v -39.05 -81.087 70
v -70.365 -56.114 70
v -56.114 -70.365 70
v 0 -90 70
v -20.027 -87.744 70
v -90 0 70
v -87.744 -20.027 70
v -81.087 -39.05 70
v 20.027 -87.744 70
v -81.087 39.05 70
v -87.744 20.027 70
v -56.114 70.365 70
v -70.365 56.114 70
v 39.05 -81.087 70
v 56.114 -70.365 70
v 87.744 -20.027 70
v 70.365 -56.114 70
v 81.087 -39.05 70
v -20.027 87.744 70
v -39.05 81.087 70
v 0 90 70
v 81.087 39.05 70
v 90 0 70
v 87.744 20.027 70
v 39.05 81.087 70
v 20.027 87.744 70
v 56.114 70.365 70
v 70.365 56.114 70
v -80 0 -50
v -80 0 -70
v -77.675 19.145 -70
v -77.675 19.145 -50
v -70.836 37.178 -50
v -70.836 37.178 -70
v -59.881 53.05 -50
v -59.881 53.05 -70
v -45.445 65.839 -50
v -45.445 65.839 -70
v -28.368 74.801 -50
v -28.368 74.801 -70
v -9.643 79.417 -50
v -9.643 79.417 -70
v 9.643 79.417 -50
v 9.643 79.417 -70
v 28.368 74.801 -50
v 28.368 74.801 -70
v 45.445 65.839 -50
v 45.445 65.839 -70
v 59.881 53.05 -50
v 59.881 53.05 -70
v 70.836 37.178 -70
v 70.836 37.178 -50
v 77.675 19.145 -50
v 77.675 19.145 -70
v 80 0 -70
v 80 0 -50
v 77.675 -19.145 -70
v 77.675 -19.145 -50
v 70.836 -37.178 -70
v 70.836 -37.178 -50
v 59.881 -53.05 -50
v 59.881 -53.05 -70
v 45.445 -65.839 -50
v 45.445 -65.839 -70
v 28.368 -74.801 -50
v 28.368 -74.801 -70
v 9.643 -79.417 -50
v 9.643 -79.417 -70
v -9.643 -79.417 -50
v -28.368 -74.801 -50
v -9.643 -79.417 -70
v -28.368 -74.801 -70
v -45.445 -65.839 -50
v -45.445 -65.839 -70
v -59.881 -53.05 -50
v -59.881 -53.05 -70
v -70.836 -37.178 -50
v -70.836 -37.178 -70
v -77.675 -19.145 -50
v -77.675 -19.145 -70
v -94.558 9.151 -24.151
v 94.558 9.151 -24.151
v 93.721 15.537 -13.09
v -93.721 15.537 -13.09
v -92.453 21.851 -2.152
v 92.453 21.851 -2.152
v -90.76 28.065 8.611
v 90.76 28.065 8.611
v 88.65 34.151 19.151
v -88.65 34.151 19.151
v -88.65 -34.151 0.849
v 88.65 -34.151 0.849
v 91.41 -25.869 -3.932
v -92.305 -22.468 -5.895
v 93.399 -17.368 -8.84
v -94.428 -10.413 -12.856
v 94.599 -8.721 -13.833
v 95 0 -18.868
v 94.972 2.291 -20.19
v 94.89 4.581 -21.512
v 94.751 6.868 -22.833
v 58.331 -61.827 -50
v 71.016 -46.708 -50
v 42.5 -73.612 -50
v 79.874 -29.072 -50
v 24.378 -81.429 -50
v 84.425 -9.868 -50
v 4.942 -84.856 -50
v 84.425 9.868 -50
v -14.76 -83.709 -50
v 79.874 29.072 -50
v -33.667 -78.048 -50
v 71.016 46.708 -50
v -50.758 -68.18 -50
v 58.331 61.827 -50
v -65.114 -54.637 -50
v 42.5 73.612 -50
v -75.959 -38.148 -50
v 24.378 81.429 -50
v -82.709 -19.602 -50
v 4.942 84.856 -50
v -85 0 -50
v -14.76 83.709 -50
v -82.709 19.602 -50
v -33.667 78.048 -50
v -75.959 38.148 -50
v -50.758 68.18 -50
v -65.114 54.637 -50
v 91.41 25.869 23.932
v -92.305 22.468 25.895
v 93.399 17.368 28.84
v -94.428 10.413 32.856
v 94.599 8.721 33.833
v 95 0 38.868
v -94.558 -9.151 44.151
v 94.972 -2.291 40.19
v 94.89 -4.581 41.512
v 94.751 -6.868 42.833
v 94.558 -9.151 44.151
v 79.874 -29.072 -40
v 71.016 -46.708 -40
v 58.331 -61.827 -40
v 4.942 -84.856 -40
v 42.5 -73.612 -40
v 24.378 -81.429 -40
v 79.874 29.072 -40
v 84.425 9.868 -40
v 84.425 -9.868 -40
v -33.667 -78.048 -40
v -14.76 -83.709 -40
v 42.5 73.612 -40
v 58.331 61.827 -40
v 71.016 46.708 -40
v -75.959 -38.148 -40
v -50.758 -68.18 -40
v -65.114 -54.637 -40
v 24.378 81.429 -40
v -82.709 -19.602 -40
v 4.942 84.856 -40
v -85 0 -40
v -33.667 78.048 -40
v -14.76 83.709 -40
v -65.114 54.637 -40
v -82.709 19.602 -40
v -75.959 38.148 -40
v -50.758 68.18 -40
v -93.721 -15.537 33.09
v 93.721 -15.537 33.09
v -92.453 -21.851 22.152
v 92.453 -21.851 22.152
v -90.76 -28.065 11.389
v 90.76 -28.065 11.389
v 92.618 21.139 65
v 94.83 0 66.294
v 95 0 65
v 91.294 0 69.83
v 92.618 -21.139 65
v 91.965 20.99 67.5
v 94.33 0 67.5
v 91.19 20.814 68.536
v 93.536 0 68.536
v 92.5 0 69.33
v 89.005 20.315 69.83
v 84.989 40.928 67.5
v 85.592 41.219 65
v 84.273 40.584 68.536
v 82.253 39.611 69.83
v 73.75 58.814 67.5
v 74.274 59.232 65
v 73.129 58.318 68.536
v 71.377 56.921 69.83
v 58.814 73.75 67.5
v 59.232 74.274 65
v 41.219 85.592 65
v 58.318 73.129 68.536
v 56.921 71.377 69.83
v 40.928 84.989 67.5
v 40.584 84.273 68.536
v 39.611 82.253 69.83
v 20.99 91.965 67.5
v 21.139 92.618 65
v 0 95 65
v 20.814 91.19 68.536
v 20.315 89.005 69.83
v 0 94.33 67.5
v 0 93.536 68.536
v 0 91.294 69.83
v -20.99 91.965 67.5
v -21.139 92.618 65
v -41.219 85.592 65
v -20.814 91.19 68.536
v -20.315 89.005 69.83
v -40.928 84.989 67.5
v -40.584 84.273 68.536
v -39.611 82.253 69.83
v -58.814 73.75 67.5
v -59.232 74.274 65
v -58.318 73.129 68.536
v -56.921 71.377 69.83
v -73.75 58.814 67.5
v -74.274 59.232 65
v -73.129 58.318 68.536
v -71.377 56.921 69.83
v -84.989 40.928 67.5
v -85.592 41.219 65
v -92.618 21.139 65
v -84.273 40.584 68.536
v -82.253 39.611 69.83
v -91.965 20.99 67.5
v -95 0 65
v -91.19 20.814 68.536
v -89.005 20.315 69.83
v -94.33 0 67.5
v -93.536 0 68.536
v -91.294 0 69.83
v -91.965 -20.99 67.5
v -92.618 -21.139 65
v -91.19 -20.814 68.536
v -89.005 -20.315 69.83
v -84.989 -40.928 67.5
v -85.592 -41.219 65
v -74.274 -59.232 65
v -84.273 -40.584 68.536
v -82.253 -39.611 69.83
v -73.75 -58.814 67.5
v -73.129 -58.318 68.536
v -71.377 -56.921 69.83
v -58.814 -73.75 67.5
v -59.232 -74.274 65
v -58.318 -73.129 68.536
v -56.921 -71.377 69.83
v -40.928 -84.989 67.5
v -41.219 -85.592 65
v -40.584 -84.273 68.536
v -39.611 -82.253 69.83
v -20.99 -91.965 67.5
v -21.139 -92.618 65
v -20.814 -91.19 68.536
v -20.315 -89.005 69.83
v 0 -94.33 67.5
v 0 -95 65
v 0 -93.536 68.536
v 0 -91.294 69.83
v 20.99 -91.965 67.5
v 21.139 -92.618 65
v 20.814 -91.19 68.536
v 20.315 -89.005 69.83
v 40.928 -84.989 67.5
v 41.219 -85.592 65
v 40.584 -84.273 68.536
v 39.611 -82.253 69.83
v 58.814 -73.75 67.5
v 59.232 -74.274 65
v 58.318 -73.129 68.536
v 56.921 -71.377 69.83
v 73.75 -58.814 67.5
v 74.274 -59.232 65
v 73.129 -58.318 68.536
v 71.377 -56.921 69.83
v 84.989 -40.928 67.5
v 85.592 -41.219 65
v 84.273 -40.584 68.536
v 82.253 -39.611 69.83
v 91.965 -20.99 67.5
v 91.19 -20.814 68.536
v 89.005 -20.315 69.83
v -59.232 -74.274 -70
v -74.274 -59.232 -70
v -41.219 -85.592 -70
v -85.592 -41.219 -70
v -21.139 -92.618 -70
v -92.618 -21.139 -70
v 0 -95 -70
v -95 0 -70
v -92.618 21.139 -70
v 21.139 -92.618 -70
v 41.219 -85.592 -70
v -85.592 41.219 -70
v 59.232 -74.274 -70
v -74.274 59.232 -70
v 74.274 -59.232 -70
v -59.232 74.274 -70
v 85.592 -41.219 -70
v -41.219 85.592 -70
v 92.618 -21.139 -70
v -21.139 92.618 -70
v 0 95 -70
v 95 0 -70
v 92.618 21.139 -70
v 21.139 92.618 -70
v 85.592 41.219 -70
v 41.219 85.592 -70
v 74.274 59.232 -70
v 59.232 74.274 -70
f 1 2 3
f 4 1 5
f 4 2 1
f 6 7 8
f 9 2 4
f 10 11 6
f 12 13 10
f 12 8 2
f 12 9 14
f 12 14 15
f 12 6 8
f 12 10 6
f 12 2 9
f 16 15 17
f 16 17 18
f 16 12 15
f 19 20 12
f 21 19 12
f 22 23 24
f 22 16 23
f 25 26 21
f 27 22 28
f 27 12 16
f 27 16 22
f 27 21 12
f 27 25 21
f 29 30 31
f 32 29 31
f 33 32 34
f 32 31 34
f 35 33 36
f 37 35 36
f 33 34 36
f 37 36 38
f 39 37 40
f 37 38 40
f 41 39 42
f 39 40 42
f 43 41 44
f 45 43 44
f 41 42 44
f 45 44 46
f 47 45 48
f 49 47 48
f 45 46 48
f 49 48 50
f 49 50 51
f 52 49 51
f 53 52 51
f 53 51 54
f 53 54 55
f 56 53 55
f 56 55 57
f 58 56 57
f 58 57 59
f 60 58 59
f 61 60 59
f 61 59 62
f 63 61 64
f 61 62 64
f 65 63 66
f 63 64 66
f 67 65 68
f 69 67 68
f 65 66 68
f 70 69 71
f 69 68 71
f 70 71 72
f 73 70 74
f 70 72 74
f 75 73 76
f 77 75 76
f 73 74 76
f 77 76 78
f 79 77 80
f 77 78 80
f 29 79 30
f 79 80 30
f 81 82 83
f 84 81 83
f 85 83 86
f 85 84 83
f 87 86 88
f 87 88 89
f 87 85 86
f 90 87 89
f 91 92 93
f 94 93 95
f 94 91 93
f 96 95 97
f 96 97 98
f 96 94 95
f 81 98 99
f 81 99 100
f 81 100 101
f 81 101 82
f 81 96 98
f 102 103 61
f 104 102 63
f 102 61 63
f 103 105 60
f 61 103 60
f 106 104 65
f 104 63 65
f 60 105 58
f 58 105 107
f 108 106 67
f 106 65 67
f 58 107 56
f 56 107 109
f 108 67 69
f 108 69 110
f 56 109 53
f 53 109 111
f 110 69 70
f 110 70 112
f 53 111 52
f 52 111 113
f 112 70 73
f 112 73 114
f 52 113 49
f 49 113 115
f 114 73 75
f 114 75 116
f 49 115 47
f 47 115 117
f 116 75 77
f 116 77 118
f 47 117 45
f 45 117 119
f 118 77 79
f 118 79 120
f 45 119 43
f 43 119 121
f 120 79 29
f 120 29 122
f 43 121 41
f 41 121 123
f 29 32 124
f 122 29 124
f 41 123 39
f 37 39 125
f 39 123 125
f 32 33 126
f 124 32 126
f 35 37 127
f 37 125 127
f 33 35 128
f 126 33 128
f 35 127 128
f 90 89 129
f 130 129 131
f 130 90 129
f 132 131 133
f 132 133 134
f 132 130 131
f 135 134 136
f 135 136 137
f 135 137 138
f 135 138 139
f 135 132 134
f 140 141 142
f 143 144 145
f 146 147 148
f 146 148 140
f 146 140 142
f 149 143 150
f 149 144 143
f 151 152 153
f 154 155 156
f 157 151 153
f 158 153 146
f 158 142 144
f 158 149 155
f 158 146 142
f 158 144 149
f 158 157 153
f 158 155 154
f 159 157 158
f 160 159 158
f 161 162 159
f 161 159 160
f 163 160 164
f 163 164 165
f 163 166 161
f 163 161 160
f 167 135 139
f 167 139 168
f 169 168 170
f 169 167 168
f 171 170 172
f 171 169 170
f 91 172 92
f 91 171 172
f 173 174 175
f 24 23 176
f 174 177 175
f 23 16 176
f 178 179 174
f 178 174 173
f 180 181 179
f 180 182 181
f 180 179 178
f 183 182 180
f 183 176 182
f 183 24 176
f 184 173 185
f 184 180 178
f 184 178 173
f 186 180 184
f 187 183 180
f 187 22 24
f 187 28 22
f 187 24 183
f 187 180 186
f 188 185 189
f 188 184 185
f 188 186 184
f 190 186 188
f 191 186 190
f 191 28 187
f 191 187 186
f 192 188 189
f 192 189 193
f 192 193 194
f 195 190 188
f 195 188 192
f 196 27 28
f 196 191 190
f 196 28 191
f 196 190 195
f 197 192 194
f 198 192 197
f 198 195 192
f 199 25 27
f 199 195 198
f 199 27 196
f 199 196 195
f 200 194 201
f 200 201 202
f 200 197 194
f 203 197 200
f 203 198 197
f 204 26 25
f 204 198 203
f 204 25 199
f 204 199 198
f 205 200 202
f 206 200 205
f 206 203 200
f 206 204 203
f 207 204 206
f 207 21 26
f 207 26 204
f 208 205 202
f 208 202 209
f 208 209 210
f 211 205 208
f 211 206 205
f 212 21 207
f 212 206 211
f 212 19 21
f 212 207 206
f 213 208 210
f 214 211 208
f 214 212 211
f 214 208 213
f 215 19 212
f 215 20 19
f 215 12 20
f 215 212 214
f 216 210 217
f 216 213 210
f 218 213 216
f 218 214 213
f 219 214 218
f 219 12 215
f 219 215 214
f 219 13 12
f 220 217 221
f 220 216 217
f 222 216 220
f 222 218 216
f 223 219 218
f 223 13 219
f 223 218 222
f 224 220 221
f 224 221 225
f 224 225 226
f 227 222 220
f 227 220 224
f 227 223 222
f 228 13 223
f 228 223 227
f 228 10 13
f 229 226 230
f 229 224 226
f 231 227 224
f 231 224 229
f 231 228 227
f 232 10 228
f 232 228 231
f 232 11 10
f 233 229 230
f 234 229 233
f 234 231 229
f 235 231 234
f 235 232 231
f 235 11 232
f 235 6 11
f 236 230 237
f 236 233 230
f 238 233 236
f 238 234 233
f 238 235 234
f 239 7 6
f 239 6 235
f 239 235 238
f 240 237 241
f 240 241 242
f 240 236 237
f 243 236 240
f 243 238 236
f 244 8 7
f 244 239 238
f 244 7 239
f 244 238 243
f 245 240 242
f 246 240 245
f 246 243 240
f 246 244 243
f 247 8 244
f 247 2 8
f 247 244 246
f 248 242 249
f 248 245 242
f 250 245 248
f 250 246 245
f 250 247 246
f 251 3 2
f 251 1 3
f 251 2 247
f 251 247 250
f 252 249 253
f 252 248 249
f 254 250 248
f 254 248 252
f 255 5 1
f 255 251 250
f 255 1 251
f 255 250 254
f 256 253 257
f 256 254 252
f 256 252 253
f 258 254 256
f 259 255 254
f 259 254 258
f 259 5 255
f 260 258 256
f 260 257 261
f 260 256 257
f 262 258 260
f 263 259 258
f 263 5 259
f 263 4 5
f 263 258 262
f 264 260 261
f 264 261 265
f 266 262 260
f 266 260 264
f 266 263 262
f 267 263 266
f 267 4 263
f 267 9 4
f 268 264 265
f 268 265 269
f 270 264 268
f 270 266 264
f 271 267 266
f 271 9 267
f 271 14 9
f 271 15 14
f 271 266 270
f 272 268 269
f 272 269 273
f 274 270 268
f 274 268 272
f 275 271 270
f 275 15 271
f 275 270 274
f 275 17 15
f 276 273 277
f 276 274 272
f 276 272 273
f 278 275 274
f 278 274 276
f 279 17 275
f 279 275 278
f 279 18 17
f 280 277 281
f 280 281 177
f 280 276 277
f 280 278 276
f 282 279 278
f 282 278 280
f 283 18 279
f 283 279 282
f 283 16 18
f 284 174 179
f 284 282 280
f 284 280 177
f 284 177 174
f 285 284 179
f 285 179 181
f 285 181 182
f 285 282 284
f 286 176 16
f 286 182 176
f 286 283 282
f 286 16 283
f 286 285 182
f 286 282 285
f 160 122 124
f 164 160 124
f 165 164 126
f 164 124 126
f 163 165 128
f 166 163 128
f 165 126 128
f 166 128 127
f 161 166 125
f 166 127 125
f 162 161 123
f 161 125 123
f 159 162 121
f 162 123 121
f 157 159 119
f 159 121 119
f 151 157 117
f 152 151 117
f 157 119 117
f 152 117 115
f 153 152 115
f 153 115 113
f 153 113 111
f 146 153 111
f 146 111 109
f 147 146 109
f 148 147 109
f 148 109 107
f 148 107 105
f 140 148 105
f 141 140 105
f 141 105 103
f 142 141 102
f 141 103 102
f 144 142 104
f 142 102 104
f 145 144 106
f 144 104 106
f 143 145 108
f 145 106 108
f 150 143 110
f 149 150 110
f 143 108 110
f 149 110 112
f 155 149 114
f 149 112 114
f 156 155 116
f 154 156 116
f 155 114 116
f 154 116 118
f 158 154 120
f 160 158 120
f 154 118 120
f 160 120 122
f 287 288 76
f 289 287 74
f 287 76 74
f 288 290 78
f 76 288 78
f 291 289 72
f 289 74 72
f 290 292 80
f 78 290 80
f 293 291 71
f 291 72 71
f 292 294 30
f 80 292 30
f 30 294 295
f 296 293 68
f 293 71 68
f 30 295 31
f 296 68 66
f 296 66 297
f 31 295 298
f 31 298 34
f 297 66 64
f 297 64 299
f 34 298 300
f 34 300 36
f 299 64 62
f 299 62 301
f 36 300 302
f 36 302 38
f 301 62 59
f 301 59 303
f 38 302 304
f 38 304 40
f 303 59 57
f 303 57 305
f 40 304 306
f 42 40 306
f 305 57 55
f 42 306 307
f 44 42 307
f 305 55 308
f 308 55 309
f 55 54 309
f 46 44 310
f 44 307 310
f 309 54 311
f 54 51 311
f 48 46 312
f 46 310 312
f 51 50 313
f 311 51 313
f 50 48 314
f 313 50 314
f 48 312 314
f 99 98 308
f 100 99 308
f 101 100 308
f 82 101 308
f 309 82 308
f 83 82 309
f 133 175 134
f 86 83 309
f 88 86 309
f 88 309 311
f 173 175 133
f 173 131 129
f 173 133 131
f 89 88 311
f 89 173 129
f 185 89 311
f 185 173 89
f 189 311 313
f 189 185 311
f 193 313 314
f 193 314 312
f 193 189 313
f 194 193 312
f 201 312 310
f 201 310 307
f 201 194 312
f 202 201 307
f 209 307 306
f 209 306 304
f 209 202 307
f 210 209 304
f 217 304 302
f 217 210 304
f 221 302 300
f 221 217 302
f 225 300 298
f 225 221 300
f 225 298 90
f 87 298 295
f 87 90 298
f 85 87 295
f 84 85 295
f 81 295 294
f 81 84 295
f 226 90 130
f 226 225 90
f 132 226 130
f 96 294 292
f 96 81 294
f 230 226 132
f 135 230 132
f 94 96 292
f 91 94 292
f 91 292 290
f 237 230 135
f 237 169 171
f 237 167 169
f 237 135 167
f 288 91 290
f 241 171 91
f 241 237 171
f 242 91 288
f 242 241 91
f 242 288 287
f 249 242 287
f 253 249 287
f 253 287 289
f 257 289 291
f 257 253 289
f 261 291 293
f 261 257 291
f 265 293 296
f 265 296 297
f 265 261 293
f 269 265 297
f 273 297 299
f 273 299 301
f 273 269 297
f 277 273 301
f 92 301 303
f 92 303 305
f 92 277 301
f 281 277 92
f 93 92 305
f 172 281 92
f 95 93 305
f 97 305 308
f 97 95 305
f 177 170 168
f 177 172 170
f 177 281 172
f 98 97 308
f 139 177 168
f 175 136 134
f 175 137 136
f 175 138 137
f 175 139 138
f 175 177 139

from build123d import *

# Parameters (mm, degrees)
SKETCH1_R                     = 95
BOSS_EXTRUDE1_DEPTH           = 70
SKETCH2_R                     = 80
CUT_EXTRUDE4_DEPTH            = 20
SKETCH5_R                     = 85
CUT_EXTRUDE5_DEPTH            = 10
RACCORDO1_R                   = 5
TAGLIO_ESTRUSIONE1_DEPTH      = 152.492574122
TAGLIO_ESTRUSIONE1_DEPTH_BACK = 152.492574122


with BuildPart() as part:
    # Sketch1 → Boss-Extrude1 (new, symmetric)
    with BuildSketch(Plane.XY):
        Circle(SKETCH1_R)
    extrude(amount=BOSS_EXTRUDE1_DEPTH, both=True)

    # Sketch2 → Cut-Extrude4 (cut)
    with BuildSketch(Plane(origin=(0, 0, -70), x_dir=(-1, 0, 0), z_dir=(0, 0, -1))):
        Circle(SKETCH2_R)
    extrude(amount=-CUT_EXTRUDE4_DEPTH, mode=Mode.SUBTRACT)

    # Sketch5 → Cut-Extrude5 (cut)
    with BuildSketch(Plane(origin=(0, 0, -50), x_dir=(-1, 0, 0), z_dir=(0, 0, -1))):
        Circle(SKETCH5_R)
    extrude(amount=-CUT_EXTRUDE5_DEPTH, mode=Mode.SUBTRACT)

    # Raccordo1
    raccordo1_edges = [part.edges().sort_by_distance(p)[0] for p in [
        (-95, 0, 70),
    ]]
    fillet(raccordo1_edges, radius=RACCORDO1_R)

    # Schizzo2 → Taglio-Estrusione1 (cut, two sides: drawn at the far end of the back side and taken through both)
    with BuildSketch(Plane(origin=(0, 0, 0), x_dir=(0, 0, -1), z_dir=(1, 0, 0)).offset(-TAGLIO_ESTRUSIONE1_DEPTH_BACK)):
        Polygon((24.150635095, 9.150635095), (-19.150635095, 34.150635095), (-44.150635095, -9.150635095), (-0.849364905, -34.150635095), align=None)
    extrude(amount=TAGLIO_ESTRUSIONE1_DEPTH + TAGLIO_ESTRUSIONE1_DEPTH_BACK, mode=Mode.SUBTRACT)


solid = part.part
